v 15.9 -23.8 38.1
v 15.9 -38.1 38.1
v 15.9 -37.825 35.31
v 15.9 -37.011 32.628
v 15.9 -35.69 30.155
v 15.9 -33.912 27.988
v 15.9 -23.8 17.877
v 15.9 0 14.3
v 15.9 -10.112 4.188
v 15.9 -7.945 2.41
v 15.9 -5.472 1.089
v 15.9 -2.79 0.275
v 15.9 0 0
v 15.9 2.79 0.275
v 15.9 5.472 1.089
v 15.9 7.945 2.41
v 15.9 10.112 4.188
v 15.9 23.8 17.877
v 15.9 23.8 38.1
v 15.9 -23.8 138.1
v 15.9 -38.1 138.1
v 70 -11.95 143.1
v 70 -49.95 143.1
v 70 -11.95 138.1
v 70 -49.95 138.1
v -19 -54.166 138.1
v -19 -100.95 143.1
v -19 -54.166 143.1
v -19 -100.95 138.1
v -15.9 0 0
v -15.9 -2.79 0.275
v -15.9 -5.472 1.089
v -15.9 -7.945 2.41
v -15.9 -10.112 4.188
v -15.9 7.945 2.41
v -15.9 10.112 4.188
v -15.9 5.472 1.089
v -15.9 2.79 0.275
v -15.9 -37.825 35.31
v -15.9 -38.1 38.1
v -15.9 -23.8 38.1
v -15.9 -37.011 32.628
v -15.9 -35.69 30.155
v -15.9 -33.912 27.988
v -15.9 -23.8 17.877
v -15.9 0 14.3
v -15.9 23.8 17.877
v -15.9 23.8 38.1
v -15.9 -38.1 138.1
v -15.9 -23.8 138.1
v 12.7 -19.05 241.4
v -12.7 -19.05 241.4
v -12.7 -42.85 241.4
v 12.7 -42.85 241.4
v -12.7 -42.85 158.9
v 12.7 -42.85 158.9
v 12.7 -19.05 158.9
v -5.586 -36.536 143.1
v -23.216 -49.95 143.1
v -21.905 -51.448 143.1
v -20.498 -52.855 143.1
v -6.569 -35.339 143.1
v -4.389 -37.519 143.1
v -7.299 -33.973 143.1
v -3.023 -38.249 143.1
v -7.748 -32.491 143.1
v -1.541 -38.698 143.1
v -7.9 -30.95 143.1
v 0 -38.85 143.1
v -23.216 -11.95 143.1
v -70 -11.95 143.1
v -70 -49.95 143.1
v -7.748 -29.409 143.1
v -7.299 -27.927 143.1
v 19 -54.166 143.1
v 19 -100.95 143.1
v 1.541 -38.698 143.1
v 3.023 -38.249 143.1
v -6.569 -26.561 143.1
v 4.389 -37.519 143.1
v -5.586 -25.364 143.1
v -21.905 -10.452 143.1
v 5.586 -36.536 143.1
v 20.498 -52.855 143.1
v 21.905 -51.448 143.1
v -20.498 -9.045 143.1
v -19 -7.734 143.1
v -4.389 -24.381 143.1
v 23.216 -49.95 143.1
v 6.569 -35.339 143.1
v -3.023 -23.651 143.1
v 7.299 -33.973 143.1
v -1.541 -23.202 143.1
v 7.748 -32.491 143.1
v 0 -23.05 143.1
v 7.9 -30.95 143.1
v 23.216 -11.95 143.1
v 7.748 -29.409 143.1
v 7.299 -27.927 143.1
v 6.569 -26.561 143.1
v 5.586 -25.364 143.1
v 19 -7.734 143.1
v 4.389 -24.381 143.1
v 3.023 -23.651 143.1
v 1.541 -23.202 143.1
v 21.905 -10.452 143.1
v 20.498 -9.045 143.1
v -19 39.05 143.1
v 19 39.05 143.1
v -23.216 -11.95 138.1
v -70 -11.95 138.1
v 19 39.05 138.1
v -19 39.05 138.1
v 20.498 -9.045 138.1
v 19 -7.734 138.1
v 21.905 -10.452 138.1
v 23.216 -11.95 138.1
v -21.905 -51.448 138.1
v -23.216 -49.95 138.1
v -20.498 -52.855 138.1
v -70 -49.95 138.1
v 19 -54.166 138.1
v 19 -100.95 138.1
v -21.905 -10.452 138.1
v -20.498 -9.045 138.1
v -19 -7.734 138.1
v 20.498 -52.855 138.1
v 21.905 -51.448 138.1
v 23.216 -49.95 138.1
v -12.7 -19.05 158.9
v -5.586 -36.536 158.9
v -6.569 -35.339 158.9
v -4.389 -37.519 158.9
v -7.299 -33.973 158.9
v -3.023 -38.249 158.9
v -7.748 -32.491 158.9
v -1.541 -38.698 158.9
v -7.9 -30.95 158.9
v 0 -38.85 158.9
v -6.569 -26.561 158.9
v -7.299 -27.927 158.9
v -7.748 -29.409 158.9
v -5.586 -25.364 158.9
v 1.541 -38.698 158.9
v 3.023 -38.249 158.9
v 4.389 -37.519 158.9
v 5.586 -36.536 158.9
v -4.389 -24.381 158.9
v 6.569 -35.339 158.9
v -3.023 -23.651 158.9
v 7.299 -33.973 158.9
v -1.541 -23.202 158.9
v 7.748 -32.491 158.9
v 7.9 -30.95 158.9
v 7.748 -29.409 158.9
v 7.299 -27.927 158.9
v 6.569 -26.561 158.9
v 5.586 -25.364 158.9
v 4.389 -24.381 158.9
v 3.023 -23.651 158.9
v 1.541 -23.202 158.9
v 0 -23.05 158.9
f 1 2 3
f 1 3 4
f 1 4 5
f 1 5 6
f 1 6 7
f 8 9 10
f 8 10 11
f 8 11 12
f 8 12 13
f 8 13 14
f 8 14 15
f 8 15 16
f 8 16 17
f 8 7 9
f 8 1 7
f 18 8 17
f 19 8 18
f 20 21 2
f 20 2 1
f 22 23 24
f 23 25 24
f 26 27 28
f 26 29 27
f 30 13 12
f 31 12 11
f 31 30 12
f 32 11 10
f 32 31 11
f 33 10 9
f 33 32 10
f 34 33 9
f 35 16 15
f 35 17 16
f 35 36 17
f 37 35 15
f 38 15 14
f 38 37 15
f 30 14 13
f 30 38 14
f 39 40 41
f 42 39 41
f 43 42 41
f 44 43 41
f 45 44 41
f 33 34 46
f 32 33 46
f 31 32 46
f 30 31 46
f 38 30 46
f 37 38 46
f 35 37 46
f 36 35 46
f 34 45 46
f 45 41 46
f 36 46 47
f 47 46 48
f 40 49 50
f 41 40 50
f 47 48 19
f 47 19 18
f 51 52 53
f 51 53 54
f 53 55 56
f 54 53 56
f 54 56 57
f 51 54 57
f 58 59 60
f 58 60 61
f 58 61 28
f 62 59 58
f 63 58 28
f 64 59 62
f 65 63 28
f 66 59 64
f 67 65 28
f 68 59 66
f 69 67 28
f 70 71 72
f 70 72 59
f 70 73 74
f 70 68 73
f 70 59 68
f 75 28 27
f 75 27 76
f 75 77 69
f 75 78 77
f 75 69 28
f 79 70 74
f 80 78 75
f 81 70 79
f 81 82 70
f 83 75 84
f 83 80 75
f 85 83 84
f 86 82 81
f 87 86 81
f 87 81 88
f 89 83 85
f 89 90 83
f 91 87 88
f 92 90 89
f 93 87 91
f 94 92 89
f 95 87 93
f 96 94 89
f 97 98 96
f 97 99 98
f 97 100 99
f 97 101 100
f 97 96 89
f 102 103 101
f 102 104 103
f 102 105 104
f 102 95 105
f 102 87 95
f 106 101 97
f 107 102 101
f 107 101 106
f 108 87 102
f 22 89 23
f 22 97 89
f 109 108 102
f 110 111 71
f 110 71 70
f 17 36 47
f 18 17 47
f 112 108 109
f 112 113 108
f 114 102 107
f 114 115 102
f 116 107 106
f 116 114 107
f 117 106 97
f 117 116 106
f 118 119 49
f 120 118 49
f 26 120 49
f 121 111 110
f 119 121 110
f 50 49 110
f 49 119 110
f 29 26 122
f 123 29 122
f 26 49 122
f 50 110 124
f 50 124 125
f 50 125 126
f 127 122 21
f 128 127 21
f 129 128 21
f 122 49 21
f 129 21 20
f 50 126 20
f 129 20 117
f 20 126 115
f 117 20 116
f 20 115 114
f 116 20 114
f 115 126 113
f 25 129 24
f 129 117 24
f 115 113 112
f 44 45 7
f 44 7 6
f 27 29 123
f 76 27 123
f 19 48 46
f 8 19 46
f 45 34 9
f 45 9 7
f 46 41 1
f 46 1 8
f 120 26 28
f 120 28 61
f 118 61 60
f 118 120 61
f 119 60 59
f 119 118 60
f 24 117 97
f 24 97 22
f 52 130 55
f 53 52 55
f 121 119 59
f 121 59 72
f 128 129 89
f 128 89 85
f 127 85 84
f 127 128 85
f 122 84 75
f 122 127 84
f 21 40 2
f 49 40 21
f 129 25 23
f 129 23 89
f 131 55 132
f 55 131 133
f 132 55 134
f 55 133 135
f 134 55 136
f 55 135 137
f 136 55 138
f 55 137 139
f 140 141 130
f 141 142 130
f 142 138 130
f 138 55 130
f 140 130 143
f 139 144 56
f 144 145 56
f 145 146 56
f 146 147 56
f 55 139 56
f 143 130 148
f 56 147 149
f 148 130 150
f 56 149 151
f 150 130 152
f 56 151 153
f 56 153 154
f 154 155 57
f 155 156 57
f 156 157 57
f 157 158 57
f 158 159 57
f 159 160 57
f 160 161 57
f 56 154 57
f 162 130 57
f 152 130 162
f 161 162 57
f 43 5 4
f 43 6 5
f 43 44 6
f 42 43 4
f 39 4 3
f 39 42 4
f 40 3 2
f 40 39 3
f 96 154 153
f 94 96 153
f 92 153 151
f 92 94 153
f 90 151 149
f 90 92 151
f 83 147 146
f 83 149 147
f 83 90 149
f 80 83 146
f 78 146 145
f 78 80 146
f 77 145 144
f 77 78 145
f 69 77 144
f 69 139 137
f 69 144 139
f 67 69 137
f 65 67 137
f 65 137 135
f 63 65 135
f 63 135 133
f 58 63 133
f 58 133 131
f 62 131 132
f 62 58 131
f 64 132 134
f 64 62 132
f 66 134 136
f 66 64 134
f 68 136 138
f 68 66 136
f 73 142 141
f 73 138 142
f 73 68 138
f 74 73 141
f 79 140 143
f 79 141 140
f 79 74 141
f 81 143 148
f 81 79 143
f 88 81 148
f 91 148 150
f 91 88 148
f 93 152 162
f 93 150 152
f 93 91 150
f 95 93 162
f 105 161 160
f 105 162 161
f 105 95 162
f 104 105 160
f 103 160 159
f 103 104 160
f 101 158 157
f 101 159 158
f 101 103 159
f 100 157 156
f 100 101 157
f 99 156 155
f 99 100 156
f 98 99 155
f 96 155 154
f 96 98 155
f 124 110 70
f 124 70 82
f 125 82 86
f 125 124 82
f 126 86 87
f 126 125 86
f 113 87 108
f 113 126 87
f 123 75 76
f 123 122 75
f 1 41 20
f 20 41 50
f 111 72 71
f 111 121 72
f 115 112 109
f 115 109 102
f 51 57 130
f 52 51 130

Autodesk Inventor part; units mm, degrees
ref_plane "YZ Plane" through (0, 0, 0) normal (1, 0, 0) x (0, 1, 0)
ref_plane "XZ Plane" through (0, 0, 0) normal (0, 1, 0) x (-1, 0, 0)
ref_plane "XY Plane" through (0, 0, 0) normal (0, 0, 1) x (1, 0, 0)
sketch "Boceto1" plane through (0, 0, 0) normal (1, 0, 0) x (0, 1, 0)
  line L0 (0, 0) -> (0, 14.3) construction
  line L1 (0, 14.3) -> (-23.8, 14.3) construction
  line L2 (-23.8, 14.3) -> (-23.8, 38.1) construction
  line L3 (-23.8, 38.1) -> (0, 14.3)
  circle A0 centre (0, 14.3) radius 14.3 construction
  line L4 (-10.1116, 4.1884) -> (-23.8, 17.8767)
  arc A1 (-10.1116, 4.1884) -> (0, 0) centre (0, 14.3) ccw
  line L5 (23.8, 38.1) -> (0, 14.3)
  line L6 (10.1116, 4.1884) -> (23.8, 17.8767)
  arc A2 (0, 0) -> (10.1116, 4.1884) centre (0, 14.3) ccw
  line L7 (23.8, 38.1) -> (23.8, 17.8767)
  circle A3 centre (-23.8, 38.1) radius 14.3 construction
  line L8 (-23.8, 38.1) -> (-23.8, 138.1)
  line L9 (-23.8, 17.8767) -> (-33.9116, 27.9884)
  line L10 (-38.1, 38.1) -> (-38.1, 138.1)
  line L11 (-38.1, 138.1) -> (-23.8, 138.1)
  arc A4 (-38.1, 38.1) -> (-33.9116, 27.9884) centre (-23.8, 38.1) ccw
  dimension "d0" = 14.3
  dimension "d1" = 23.8
  dimension "d2" = 23.8
  dimension "d3" = 28.6
  dimension "d4" = 100
  dimension "d7" = 23.8
  dimension "d8" = 47.6
  dimension "d9" = 47.9583
extrude "Extrusión1" add sketch "Boceto1" along normal mid plane 31.8
sketch "Boceto2" plane through (-15.9, -38.1, 138.1) normal (0, 0, 1) x (1, 0, 0)
  line L0 (0, 14.3) -> (31.8, 14.3) construction
  line L1 (31.8, 0) -> (31.8, 4.1884) construction
  line L2 (0, 14.3) -> (31.8, 0) construction
  line L3 (15.9, 7.15) -> (-3.1, 7.15) construction
  line L4 (-3.1, 7.15) -> (-3.1, 77.15) construction
  line L5 (-3.1, 77.15) -> (15.9, 77.15) construction
  line L6 (15.9, 77.15) -> (15.9, 7.15) construction
  line L7 (15.9, 7.15) -> (-54.1, 7.15) construction
  line L8 (-54.1, 7.15) -> (-54.1, 26.15) construction
  line L9 (-54.1, 26.15) -> (15.9, 26.15) construction
  line L10 (15.9, 26.15) -> (15.9, 7.15) construction
  circle A0 centre (15.9, 7.15) radius 30 construction
  line L11 (15.9, 77.15) -> (-3.1, 77.15)
  line L12 (-3.1, 30.3664) -> (-3.1, 77.15)
  line L13 (-54.1, 7.15) -> (-54.1, 26.15)
  line L14 (-54.1, 26.15) -> (-7.3164, 26.15)
  arc A1 (-3.1, 30.3664) -> (-7.3164, 26.15) centre (15.9, 7.15) ccw
  line L15 (-54.1, -11.85) -> (-54.1, 7.15) construction
  line L16 (15.9, -11.85) -> (-54.1, -11.85) construction
  line L17 (-7.3164, -11.85) -> (-54.1, -11.85)
  line L18 (-54.1, 7.15) -> (-54.1, -11.85)
  line L19 (15.9, -62.85) -> (-3.1, -62.85) construction
  line L20 (15.9, -62.85) -> (-3.1, -62.85)
  line L21 (-3.1, -62.85) -> (-3.1, 7.15) construction
  line L22 (-3.1, -62.85) -> (-3.1, -16.0664)
  arc A2 (-7.3164, -11.85) -> (-3.1, -16.0664) centre (15.9, 7.15) ccw
  line L23 (34.9, -62.85) -> (15.9, -62.85) construction
  line L24 (34.9, 7.15) -> (34.9, -62.85) construction
  line L25 (34.9, -16.0664) -> (34.9, -62.85)
  line L26 (15.9, -62.85) -> (34.9, -62.85)
  line L27 (85.9, 7.15) -> (85.9, -11.85) construction
  line L28 (85.9, 7.15) -> (85.9, -11.85)
  line L29 (85.9, -11.85) -> (15.9, -11.85) construction
  line L30 (85.9, -11.85) -> (39.1164, -11.85)
  arc A3 (34.9, -16.0664) -> (39.1164, -11.85) centre (15.9, 7.15) ccw
  line L31 (85.9, 26.15) -> (85.9, 7.15) construction
  line L32 (15.9, 26.15) -> (85.9, 26.15) construction
  line L33 (39.1164, 26.15) -> (85.9, 26.15)
  line L34 (85.9, 7.15) -> (85.9, 26.15)
  line L35 (15.9, 77.15) -> (34.9, 77.15) construction
  line L36 (15.9, 77.15) -> (34.9, 77.15)
  line L37 (34.9, 77.15) -> (34.9, 7.15) construction
  line L38 (34.9, 77.15) -> (34.9, 30.3664)
  arc A4 (39.1164, 26.15) -> (34.9, 30.3664) centre (15.9, 7.15) ccw
  point P0 (15.9, 38.1)
  point P1 (-54.1, 7.15)
  point P2 (85.9, 7.15)
  dimension "d10" = 19
  dimension "d11" = 70
  dimension "d12" = 70
  dimension "d13" = 19
  dimension "d14" = 60
  dimension "d17" = 360
extrude "Extrusión2" add sketch "Boceto2" along normal blind 5
sketch "Boceto3" plane through (-15.9, -38.1, 143.1) normal (0, 0, 1) x (1, 0, 0)
  arc A0 (39.1164, 26.15) -> (34.9, 30.3664) centre (15.9, 7.15) ccw projected
  circle A1 centre (15.9, 7.15) radius 7.9
  point P0 (15.9, 38.1)
  dimension "d21" = 15.8
extrude "Extrusión3" add sketch "Boceto3" along normal blind 15.8
sketch "Boceto4" plane through (0, -30.95, 158.9) normal (0, 0, 1) x (1, 0, 0)
  line L0 (12.7, 11.9) -> (-12.7, 11.9)
  line L1 (-12.7, 11.9) -> (-12.7, -11.9)
  line L2 (-12.7, -11.9) -> (12.7, -11.9)
  line L3 (12.7, -11.9) -> (12.7, 11.9)
  circle A0 centre (0, 0) radius 7.9 projected
  point P0 (0, 30.95)
  point P1 (12.7, 0)
  point P2 (0, -11.9)
  dimension "d24" = 25.4
  dimension "d25" = 23.8
extrude "Extrusión4" add sketch "Boceto4" along normal blind 82.5 contours L3 L2 L1 L0 | A0
